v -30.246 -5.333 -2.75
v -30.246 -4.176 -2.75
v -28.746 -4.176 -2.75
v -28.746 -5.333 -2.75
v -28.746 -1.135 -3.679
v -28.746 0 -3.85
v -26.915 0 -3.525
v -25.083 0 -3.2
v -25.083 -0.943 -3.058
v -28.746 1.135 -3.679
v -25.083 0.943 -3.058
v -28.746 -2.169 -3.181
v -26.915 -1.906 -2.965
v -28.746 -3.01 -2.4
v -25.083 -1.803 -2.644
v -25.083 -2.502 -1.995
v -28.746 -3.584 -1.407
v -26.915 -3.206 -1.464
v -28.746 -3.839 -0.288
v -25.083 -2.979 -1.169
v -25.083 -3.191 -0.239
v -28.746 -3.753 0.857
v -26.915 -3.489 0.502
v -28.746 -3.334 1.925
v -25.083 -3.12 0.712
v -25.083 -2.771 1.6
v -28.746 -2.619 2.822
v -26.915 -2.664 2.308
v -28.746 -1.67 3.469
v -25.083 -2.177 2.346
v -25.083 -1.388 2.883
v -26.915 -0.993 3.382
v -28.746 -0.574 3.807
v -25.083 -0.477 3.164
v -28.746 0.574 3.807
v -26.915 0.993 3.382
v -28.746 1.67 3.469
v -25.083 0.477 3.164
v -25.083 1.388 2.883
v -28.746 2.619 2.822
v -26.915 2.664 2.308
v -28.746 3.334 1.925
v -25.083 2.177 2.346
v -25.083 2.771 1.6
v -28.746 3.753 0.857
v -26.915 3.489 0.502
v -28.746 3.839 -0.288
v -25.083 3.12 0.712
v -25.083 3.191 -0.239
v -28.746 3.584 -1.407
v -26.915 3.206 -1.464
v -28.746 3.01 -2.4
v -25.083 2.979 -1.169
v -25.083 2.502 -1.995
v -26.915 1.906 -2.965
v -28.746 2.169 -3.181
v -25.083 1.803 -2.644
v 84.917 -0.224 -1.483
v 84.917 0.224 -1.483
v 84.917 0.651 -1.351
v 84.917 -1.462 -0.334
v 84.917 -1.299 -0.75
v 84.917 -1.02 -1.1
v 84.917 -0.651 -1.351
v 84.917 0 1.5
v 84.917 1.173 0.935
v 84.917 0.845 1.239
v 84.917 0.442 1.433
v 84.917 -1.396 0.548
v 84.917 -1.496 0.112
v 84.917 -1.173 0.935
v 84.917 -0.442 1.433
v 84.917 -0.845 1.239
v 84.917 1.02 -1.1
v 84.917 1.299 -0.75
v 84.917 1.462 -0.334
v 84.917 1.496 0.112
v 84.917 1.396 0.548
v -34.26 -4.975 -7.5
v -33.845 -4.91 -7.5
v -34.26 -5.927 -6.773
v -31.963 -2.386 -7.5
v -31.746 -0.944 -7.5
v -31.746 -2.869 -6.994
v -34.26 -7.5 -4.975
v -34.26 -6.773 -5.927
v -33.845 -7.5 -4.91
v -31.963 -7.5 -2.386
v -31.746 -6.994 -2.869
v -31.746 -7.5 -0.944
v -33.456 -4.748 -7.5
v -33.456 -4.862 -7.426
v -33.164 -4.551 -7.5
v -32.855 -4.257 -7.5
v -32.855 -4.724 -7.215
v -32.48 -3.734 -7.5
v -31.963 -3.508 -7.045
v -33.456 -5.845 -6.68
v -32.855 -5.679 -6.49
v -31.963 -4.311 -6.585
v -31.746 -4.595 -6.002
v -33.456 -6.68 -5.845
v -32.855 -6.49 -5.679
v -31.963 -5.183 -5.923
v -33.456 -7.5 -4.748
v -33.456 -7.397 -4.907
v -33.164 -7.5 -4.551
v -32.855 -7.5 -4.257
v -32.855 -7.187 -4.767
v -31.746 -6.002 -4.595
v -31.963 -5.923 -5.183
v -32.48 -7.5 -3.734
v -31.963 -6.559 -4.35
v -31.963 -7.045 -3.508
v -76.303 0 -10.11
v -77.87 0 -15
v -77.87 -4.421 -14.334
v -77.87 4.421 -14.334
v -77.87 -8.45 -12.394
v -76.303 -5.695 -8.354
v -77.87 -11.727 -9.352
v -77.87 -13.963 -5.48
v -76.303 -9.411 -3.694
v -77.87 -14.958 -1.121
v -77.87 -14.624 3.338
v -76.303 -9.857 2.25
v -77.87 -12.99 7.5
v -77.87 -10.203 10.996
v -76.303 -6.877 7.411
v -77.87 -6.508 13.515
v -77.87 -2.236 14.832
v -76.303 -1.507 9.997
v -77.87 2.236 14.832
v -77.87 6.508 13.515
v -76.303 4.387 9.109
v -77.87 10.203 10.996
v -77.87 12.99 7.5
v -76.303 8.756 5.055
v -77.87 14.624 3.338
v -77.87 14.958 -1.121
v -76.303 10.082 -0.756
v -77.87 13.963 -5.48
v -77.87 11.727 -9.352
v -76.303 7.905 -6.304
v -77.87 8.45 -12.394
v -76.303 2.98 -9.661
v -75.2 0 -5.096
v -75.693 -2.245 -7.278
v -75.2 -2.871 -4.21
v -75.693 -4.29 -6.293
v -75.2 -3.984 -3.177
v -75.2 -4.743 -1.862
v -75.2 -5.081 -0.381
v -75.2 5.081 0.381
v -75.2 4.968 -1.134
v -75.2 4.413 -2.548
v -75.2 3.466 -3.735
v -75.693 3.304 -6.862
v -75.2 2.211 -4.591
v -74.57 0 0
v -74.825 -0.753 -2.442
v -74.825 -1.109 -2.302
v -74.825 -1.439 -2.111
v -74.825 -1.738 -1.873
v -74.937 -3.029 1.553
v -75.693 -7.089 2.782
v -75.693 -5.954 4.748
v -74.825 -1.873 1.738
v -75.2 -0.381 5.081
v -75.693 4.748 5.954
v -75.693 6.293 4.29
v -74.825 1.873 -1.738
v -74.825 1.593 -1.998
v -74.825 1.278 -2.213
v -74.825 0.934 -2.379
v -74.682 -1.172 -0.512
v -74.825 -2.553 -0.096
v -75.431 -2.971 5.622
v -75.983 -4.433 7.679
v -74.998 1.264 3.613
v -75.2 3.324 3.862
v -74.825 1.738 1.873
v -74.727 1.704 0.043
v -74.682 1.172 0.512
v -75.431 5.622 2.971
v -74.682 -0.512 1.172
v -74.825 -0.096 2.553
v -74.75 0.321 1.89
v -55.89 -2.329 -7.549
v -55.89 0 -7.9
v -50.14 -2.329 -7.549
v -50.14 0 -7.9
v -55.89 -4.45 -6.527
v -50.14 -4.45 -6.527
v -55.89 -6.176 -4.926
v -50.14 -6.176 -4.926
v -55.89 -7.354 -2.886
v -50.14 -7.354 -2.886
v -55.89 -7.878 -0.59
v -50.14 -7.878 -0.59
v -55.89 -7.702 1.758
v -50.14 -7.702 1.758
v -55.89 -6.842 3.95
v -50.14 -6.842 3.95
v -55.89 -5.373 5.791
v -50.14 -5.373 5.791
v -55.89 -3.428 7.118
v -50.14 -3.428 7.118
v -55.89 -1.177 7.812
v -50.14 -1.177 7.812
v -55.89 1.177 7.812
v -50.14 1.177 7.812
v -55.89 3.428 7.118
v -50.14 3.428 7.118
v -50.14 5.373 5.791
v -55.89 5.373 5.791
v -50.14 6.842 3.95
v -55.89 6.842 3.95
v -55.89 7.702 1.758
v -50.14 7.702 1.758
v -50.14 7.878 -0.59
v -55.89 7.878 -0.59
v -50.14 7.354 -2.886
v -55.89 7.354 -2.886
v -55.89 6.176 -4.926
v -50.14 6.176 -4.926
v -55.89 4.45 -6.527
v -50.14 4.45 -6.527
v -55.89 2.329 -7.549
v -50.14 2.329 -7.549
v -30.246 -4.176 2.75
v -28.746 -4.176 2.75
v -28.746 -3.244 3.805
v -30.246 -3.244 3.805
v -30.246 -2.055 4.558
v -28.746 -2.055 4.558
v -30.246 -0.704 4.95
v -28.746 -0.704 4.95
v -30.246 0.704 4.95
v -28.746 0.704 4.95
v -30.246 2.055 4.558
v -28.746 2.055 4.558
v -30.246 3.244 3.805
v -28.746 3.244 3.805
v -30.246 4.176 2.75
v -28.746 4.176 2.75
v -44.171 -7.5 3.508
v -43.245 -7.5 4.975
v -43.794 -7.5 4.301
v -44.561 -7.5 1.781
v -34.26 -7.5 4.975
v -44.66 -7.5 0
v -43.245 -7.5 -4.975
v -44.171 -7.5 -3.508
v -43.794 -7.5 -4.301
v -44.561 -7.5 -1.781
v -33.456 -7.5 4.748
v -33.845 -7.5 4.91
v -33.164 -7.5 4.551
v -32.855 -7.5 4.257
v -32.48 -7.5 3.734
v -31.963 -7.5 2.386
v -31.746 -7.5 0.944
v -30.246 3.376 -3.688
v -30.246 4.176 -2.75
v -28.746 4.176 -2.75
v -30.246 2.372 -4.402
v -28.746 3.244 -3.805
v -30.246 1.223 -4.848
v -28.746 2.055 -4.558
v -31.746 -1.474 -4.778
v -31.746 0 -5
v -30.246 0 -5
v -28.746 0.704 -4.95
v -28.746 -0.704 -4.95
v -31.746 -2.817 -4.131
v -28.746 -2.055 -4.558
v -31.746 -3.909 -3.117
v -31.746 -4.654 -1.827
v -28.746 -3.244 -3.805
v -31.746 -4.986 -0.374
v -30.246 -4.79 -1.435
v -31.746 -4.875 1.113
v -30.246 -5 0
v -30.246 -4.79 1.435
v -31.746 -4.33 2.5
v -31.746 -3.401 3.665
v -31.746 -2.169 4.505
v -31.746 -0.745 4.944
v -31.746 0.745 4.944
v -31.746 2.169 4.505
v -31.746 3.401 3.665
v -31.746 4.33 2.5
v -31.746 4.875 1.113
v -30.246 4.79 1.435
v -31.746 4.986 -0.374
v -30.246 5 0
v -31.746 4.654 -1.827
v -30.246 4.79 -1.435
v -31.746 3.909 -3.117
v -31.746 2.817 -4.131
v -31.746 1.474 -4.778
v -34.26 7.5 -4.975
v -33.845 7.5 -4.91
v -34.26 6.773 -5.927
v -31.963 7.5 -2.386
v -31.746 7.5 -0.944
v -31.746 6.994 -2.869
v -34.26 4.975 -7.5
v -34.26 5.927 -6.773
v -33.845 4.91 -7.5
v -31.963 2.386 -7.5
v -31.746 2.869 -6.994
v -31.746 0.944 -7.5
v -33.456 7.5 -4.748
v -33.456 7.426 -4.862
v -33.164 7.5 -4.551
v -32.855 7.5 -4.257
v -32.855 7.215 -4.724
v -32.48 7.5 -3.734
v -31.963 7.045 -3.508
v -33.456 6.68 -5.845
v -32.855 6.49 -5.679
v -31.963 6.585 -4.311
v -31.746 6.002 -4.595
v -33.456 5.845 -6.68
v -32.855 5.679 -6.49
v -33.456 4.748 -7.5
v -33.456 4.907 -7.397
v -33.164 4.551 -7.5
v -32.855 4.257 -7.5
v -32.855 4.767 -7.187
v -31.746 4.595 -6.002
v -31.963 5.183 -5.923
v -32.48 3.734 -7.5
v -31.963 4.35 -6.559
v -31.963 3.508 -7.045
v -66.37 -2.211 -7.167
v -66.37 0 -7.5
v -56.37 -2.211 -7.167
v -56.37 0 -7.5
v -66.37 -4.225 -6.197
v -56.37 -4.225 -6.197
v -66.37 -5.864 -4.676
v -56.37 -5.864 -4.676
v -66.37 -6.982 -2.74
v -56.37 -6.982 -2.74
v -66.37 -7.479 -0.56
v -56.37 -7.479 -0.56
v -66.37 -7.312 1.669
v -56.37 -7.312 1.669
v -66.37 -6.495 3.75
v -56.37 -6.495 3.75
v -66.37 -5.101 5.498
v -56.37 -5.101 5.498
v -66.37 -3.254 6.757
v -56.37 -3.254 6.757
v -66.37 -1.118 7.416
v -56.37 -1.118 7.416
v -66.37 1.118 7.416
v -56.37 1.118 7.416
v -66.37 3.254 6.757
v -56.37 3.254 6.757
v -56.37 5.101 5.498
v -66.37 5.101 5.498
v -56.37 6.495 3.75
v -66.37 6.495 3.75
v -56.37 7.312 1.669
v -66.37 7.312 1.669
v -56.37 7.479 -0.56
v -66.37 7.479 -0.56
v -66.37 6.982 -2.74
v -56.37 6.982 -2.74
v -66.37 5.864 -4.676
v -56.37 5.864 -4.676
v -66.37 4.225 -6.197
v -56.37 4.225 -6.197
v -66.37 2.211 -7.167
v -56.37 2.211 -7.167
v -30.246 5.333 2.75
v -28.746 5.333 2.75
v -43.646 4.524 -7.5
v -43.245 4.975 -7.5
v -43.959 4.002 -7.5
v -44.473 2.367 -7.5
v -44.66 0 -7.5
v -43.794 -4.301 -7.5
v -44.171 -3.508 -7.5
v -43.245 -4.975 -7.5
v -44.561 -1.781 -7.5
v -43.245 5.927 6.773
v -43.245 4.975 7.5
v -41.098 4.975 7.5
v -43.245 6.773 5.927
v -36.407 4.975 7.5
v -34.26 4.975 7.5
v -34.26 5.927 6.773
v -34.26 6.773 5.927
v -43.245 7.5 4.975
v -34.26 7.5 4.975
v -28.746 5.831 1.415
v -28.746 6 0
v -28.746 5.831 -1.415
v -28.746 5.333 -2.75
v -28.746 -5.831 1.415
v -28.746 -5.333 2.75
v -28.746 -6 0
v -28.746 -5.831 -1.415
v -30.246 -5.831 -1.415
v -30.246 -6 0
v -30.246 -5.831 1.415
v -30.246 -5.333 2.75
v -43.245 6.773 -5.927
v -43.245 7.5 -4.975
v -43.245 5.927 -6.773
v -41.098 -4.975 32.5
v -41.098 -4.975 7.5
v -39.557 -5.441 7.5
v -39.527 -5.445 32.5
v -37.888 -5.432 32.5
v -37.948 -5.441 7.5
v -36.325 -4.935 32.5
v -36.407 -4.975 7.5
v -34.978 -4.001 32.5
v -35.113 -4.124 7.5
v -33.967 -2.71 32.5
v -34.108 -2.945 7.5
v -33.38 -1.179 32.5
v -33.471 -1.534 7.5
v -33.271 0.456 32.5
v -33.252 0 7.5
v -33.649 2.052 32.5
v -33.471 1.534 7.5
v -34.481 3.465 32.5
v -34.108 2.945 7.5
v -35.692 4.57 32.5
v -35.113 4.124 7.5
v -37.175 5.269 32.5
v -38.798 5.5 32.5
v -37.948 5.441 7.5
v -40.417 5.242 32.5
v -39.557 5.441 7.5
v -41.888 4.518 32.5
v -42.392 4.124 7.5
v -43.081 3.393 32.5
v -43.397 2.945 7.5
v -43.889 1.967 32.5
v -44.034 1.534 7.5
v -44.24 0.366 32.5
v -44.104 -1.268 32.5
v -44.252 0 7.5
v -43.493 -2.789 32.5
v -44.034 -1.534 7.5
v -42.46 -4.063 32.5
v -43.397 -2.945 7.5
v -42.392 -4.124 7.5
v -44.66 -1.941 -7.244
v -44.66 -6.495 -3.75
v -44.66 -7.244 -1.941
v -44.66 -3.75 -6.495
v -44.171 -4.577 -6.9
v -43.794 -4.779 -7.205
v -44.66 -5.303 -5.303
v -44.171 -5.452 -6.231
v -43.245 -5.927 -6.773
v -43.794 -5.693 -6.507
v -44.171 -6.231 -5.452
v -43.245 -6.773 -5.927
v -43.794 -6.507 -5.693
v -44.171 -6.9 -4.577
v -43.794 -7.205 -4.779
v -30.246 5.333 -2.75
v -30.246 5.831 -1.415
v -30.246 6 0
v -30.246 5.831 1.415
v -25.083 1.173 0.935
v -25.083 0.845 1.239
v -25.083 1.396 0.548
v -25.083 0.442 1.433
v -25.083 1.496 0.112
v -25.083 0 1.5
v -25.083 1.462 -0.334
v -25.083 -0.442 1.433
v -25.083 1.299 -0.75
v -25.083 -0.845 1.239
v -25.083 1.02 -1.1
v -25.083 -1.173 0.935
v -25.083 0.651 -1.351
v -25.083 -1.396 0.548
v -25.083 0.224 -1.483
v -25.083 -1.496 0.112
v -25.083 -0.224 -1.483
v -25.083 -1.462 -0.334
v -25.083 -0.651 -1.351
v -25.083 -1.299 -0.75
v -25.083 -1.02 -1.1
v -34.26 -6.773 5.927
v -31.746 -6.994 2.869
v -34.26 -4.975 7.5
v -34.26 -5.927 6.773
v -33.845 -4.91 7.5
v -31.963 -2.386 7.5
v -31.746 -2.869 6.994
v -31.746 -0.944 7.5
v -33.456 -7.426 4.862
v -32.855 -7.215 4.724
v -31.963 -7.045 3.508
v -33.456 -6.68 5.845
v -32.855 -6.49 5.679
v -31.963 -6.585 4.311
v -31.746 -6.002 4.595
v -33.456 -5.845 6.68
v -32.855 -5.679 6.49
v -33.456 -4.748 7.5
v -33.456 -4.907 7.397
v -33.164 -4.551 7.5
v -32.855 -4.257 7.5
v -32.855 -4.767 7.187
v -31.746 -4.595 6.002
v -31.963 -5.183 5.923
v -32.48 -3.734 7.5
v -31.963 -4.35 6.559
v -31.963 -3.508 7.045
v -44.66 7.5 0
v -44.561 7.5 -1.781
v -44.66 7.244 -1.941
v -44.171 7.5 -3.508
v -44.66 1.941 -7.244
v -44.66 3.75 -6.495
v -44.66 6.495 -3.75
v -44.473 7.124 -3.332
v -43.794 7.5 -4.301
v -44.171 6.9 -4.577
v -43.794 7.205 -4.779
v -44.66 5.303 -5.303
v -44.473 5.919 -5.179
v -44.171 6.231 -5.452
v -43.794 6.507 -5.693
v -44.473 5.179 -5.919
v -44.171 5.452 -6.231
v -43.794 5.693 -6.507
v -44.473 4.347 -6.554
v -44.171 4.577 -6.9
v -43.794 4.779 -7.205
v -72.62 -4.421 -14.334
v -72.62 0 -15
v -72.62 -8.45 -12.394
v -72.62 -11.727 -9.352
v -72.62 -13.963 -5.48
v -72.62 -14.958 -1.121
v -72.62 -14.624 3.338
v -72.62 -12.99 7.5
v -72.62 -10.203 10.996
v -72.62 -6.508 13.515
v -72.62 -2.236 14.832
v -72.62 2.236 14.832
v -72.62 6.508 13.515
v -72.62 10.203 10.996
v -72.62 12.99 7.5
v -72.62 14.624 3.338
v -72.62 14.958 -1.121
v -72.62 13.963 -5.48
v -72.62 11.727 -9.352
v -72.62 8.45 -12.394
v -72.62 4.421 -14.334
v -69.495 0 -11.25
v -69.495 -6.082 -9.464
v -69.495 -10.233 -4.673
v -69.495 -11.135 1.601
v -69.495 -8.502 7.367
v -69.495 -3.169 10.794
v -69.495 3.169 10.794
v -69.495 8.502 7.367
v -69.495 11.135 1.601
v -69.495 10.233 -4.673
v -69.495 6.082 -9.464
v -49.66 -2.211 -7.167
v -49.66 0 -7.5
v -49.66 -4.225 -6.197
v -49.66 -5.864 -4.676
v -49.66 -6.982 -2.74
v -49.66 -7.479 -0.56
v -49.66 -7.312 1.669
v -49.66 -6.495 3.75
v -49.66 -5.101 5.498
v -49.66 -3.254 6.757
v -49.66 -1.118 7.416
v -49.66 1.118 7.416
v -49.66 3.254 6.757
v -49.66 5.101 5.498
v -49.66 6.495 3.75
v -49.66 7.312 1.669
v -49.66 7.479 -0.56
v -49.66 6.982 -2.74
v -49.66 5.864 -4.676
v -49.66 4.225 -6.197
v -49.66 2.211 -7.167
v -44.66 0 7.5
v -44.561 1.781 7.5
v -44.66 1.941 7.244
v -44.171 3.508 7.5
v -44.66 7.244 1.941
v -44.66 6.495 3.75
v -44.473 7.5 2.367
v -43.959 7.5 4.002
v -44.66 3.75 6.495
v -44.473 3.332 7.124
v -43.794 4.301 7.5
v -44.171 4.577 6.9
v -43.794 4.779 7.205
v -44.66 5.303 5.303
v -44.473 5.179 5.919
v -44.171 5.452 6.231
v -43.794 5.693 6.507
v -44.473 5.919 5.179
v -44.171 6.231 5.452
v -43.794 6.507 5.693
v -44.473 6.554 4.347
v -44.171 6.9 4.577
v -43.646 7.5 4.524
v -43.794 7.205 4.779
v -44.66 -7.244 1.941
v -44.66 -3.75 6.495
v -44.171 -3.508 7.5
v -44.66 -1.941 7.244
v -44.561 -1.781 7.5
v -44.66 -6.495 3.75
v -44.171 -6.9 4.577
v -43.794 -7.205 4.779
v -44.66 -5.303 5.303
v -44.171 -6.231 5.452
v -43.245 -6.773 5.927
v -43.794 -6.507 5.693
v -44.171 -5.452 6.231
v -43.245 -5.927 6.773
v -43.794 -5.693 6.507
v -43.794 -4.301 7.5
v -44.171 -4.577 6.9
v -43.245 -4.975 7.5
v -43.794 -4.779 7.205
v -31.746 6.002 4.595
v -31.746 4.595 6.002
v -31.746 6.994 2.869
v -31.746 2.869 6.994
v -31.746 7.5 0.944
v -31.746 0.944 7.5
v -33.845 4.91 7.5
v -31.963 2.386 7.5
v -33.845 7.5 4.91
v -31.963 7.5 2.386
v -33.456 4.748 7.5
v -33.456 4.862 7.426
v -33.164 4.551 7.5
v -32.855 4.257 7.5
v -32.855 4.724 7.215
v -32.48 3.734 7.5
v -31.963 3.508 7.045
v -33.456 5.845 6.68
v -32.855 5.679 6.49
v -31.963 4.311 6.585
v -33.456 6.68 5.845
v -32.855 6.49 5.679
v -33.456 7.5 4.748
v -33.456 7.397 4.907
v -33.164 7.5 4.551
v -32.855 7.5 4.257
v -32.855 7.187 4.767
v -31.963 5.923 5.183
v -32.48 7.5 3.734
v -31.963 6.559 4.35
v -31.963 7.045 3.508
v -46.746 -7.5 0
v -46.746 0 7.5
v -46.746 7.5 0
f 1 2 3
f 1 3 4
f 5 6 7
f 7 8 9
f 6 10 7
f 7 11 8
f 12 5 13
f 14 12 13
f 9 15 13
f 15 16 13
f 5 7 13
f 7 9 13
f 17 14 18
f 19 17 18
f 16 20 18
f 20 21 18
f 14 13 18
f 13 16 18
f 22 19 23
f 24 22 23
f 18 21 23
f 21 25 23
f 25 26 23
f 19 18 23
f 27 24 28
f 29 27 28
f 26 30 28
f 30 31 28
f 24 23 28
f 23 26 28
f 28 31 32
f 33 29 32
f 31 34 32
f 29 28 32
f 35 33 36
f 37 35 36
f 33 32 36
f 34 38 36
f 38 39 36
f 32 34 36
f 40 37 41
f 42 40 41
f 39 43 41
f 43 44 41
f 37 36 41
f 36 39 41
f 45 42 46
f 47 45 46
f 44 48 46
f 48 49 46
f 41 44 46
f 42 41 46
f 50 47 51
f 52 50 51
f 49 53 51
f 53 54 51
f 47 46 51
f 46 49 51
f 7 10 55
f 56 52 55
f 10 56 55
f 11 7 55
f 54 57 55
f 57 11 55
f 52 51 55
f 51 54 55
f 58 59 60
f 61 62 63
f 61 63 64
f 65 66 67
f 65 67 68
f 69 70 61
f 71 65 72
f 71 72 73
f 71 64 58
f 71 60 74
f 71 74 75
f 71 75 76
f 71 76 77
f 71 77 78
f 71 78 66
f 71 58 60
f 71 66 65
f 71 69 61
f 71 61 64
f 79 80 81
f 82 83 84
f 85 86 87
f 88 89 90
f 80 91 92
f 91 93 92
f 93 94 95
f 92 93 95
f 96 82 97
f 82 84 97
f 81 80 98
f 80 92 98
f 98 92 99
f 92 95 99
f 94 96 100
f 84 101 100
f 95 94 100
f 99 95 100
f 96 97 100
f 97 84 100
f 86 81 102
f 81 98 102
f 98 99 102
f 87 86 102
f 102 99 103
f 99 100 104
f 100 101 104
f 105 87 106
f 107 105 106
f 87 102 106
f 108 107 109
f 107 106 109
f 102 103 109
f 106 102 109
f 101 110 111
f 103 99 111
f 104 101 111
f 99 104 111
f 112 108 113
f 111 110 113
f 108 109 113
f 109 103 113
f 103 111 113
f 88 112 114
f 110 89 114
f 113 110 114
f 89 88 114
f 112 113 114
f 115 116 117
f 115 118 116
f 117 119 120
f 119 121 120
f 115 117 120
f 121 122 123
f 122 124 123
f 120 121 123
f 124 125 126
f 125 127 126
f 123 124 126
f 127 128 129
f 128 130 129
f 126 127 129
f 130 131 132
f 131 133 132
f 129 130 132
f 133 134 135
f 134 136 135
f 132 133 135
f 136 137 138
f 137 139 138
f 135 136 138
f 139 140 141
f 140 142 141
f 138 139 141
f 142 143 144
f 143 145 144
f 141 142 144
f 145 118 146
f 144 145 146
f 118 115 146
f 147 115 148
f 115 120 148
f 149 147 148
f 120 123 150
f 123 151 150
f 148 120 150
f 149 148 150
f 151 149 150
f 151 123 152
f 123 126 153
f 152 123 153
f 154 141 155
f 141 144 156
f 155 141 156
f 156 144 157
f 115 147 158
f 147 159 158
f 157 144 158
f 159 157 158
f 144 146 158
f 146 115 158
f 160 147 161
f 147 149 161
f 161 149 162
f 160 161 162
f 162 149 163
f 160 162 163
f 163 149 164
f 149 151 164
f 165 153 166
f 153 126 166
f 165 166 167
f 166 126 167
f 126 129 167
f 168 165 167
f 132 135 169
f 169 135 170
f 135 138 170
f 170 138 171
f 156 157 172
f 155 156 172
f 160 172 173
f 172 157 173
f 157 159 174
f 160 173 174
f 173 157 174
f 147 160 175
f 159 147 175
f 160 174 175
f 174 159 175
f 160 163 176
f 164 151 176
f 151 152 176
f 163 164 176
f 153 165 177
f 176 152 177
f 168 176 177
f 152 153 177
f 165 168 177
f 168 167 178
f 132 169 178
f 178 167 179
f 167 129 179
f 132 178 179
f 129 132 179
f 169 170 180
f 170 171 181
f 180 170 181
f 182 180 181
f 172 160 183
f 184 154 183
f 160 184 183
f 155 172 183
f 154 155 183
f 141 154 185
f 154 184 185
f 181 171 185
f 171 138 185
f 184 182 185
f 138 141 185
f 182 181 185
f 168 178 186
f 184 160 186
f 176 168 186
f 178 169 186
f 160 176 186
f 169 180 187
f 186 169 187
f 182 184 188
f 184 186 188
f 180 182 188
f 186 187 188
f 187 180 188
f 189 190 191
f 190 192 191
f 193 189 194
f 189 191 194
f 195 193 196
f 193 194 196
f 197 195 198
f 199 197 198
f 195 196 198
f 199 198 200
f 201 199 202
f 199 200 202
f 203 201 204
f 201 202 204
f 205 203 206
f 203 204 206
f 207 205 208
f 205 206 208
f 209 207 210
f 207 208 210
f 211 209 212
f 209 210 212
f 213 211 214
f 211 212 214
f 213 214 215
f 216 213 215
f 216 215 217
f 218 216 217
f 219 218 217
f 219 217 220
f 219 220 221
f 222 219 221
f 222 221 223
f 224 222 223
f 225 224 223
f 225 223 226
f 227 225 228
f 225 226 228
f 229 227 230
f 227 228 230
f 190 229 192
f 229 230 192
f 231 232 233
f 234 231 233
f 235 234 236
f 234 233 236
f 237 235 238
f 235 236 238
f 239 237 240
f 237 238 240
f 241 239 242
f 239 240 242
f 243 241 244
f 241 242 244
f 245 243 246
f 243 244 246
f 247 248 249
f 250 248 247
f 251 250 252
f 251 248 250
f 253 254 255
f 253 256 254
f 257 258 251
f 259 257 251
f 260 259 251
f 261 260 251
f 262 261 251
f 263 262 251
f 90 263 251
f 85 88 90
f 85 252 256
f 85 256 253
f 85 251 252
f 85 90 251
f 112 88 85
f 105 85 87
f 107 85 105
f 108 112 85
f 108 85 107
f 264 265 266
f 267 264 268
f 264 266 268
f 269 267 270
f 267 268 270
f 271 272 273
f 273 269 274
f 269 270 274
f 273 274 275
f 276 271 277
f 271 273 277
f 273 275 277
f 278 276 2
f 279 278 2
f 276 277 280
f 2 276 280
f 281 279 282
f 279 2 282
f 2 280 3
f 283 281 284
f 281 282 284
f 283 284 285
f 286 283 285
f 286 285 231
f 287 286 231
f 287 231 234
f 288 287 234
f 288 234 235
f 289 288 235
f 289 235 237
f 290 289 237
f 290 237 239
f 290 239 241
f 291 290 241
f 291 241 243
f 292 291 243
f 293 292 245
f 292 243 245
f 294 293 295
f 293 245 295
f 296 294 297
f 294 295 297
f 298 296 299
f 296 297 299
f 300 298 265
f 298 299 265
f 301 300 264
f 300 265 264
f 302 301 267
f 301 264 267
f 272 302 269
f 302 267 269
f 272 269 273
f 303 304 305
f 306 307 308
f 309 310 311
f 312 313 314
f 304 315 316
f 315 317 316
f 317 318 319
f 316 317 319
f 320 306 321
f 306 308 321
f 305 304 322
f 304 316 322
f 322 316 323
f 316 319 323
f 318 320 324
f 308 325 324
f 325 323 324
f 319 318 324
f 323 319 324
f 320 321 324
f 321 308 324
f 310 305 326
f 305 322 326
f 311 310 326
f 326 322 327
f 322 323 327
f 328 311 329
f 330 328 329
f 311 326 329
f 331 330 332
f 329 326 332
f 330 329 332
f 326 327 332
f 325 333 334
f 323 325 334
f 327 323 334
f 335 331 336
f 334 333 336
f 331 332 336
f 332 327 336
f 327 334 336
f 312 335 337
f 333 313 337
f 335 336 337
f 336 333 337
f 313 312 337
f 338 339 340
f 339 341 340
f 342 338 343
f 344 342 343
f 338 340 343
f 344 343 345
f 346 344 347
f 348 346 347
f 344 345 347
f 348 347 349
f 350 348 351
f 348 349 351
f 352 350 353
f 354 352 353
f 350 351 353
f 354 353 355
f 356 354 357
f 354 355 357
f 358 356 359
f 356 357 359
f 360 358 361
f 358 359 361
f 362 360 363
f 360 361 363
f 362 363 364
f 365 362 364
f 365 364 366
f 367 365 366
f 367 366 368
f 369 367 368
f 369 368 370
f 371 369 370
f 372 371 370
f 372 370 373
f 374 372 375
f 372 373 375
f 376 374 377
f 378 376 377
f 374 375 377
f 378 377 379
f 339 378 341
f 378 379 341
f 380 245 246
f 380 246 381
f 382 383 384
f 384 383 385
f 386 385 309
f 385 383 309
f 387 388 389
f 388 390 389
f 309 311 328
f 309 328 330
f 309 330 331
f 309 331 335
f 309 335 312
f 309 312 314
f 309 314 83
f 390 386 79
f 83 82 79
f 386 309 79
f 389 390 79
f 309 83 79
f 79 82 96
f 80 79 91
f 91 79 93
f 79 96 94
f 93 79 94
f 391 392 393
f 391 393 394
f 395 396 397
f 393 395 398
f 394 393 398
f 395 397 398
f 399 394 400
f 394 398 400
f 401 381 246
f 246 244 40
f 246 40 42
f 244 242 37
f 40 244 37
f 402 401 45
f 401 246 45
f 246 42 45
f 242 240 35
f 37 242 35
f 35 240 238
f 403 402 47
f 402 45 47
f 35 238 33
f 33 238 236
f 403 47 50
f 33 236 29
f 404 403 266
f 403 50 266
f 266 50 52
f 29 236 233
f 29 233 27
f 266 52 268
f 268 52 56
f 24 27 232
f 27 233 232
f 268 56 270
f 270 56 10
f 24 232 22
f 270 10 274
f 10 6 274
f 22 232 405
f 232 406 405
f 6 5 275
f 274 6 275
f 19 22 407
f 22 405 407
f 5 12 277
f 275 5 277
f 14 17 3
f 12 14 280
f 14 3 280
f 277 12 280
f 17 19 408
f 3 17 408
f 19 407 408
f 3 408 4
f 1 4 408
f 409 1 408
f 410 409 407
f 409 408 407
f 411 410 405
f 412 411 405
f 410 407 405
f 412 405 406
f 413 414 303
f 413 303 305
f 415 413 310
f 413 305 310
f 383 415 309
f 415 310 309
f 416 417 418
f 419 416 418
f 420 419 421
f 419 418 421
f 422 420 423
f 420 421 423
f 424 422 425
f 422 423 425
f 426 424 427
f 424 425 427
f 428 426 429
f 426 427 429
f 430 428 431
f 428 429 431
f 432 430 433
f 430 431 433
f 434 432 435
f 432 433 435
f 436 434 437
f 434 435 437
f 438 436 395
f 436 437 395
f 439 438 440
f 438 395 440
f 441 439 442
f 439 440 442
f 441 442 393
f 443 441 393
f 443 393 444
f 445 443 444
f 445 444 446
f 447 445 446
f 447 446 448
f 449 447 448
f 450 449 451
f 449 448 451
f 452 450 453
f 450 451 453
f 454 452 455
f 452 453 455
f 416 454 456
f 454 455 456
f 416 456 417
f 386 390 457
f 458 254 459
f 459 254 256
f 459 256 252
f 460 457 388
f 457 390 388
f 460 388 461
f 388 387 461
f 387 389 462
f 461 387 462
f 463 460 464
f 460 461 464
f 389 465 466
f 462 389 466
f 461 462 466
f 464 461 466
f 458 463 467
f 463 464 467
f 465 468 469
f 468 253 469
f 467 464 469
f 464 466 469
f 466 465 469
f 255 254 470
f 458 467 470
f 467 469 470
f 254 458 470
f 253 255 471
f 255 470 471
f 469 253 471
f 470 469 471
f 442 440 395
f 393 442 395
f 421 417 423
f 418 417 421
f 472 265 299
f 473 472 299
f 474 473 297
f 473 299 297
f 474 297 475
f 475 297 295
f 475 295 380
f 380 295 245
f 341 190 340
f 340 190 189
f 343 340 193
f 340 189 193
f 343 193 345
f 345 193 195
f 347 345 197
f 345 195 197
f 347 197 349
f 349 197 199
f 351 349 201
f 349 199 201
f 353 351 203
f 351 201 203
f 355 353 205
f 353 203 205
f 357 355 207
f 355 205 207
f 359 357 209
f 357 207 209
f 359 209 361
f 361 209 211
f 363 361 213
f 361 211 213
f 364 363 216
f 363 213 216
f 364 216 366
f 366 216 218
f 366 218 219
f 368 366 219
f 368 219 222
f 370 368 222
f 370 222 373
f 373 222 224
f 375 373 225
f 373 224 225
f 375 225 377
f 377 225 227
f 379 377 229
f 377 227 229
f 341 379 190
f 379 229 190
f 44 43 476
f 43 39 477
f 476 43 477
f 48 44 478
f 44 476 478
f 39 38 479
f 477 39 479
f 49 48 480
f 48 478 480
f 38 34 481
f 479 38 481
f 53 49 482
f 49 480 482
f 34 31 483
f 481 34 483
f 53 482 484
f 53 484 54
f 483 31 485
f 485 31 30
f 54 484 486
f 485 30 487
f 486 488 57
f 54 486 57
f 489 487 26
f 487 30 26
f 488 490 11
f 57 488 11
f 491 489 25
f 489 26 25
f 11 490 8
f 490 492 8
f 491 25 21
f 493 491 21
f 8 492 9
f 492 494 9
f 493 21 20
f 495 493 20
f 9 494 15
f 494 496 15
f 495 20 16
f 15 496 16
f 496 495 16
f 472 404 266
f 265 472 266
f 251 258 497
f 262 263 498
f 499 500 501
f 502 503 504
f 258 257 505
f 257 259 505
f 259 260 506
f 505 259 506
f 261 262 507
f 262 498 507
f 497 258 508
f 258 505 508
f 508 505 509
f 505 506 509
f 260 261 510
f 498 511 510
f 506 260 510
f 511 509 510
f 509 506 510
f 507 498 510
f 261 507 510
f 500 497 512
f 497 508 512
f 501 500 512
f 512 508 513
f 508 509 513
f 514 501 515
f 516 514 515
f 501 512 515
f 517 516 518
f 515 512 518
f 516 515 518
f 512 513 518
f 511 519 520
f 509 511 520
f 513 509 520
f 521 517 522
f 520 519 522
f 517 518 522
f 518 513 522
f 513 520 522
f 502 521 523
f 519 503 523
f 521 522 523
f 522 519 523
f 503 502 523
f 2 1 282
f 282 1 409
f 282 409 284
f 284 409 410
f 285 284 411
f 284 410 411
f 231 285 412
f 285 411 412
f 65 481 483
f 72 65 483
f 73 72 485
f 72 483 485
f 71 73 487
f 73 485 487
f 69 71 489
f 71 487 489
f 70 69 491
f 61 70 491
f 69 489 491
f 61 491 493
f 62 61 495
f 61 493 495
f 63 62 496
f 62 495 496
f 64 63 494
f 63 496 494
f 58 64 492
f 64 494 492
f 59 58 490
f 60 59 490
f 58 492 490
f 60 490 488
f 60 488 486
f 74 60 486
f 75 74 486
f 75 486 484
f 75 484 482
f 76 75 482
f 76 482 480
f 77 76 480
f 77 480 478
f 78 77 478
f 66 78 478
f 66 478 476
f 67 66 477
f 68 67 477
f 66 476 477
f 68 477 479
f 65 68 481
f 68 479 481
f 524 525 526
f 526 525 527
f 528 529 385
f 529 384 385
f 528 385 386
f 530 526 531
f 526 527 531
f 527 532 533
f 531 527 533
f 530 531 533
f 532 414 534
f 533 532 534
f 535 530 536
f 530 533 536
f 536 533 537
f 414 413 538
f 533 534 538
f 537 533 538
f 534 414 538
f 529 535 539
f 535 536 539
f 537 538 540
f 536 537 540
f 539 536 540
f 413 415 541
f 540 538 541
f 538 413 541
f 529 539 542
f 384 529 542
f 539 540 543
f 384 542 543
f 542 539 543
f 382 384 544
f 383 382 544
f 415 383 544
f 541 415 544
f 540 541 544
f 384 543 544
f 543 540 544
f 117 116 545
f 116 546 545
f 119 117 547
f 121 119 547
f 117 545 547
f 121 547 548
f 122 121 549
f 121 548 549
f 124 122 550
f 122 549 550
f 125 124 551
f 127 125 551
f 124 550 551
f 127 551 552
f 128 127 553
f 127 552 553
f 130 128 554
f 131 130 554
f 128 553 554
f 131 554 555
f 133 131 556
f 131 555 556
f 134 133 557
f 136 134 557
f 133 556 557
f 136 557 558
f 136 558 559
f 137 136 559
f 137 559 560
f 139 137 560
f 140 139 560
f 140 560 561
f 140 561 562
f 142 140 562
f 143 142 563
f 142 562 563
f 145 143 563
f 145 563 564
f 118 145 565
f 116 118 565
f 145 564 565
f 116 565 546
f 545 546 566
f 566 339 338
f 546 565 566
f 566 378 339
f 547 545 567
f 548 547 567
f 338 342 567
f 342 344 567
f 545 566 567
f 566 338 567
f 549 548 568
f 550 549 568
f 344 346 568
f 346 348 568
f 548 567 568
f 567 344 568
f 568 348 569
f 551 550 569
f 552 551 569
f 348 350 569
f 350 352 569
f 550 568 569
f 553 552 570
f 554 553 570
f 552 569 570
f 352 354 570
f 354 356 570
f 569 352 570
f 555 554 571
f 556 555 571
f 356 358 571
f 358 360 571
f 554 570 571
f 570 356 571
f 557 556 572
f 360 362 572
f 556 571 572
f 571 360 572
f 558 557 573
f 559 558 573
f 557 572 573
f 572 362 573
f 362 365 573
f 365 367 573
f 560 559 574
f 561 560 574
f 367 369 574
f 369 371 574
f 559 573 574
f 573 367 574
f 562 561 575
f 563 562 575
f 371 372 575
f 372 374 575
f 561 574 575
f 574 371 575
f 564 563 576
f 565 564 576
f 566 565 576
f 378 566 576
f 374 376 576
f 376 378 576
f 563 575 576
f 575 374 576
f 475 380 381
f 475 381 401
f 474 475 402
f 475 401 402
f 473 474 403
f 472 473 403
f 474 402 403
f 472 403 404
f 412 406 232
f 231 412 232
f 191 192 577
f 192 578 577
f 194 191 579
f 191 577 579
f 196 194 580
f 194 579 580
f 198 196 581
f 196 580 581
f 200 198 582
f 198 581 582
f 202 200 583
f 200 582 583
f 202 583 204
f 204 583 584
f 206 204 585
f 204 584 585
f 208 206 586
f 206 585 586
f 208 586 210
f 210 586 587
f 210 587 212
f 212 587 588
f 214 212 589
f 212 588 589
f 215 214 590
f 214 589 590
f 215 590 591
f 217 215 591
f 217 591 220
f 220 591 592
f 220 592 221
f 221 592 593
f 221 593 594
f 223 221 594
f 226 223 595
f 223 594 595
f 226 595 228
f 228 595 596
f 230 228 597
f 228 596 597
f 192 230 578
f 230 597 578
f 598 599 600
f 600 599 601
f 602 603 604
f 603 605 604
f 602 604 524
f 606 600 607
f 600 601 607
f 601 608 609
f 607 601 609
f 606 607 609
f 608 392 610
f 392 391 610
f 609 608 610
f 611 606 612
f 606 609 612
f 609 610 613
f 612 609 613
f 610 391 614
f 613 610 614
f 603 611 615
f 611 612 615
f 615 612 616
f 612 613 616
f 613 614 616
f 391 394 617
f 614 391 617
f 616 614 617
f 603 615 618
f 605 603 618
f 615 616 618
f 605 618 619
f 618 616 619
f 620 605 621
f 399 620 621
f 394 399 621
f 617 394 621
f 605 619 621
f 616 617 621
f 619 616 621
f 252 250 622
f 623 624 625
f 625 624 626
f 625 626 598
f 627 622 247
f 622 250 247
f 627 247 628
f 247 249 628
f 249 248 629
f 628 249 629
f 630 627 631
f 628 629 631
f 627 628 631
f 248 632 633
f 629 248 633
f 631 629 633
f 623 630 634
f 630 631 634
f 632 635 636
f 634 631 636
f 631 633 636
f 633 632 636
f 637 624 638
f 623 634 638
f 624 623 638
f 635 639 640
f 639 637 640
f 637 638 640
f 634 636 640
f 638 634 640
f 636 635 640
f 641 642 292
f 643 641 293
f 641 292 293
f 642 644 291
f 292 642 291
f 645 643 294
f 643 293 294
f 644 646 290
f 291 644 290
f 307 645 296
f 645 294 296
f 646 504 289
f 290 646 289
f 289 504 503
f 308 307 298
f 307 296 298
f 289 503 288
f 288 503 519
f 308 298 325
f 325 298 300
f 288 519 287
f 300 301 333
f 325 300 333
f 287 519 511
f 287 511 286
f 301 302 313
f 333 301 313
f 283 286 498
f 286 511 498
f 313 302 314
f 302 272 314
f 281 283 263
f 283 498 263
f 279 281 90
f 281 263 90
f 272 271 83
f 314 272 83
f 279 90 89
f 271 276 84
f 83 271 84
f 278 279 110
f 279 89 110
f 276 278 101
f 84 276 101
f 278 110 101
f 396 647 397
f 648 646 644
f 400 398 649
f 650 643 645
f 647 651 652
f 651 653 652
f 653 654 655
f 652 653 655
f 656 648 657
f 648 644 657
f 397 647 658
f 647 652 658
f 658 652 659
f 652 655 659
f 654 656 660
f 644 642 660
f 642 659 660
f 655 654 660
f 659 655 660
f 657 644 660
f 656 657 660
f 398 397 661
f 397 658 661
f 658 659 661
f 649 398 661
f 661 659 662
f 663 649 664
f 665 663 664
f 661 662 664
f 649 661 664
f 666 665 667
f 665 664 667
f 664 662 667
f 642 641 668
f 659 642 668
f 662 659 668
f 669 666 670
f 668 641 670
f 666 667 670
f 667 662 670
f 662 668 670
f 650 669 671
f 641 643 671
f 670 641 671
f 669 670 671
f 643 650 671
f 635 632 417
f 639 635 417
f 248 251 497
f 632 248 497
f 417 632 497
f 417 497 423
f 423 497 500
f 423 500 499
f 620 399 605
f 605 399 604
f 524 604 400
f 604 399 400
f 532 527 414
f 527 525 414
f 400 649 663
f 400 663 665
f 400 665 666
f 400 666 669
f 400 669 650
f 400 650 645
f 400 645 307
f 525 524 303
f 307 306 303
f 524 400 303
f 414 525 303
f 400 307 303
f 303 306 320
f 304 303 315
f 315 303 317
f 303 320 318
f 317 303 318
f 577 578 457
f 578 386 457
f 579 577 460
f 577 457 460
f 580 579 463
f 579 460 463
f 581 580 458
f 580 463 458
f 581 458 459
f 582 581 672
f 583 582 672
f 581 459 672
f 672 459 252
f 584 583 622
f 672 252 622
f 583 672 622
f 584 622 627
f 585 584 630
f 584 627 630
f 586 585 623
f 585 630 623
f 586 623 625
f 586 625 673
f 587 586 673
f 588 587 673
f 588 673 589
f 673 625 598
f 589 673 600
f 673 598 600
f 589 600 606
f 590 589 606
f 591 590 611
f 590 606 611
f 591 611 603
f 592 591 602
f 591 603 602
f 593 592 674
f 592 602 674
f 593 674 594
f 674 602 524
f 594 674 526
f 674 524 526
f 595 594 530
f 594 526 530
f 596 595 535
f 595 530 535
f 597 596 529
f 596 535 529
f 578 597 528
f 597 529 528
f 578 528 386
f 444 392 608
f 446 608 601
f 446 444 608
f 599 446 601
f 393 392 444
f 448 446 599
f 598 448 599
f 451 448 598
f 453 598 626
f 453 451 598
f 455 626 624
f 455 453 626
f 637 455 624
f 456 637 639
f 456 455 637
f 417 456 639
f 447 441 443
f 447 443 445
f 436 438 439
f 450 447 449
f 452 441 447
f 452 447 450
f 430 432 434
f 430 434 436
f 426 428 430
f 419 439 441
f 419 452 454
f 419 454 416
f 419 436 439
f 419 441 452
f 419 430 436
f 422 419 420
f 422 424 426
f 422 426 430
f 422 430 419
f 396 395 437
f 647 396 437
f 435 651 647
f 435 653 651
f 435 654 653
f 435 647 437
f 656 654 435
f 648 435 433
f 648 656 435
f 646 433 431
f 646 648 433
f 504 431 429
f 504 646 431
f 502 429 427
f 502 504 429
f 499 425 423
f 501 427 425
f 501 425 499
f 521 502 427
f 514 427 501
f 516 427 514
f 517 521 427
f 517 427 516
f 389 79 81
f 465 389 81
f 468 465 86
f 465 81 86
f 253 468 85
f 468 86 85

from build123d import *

# Parameters (mm, degrees)
SKETCH2_W           = 24.86541407
SKETCH2_H           = 5.423229841
SKETCH2_H_2         = 4.001260317
CUT_EXTRUDE1_DEPTH  = 15
CIRPATTERN1_COUNT   = 2
CIRPATTERN1_ANGLE   = 90
CUT_EXTRUDE2_DEPTH  = 1.5
SKETCH4_R           = 5.5
BOSS_EXTRUDE1_DEPTH = 25
SKETCH5_R           = 1.5
BOSS_EXTRUDE2_DEPTH = 110


with BuildPart() as part:
    # Sketch1 → Revolve1 (revolve)
    with BuildSketch(Plane.XY, mode=Mode.PRIVATE) as revolve1_sk:
        with BuildLine():
            ThreePointArc((-74.569724464, 0), (-75.692690434, -7.615947487), (-77.869724464, -15))
            Line((-77.869724464, -15), (-72.619724464, -15))
            Line((-72.619724464, -15), (-66.369724464, -7.5))
            Line((-66.369724464, -7.5), (-56.369724464, -7.5))
            Line((-56.369724464, -7.5), (-55.889724464, -7.9))
            Line((-55.889724464, -7.9), (-50.139724464, -7.9))
            Line((-50.139724464, -7.9), (-49.659724464, -7.5))
            Line((-49.659724464, -7.5), (-44.659724464, -7.5))
            ThreePointArc((-44.659724464, -7.5), (-44.085344133, -8.375316627), (-43.245187811, -9))
            Line((-43.245187811, -9), (-40.559724464, -9))
            Line((-40.559724464, -9), (-34.259724464, -9))
            ThreePointArc((-34.259724464, -9), (-32.817493666, -8.603076001), (-31.746136172, -7.559154808))
            Line((-31.746136172, -7.559154808), (-31.746136172, -5))
            Line((-31.746136172, -5), (-30.246136172, -5))
            Line((-30.246136172, -5), (-30.246136172, -6))
            Line((-30.246136172, -6), (-28.746136172, -6))
            Line((-28.746136172, -6), (-28.746136172, -3.85))
            Line((-28.746136172, -3.85), (-25.083482145, -3.2))
            Line((-25.083482145, -3.2), (-25.083482145, 0))
            Line((-25.083482145, 0), (-74.569724464, 0))
        make_face()
    revolve(revolve1_sk.sketch.rotate(Axis((88.99, 0, 0), (-1, 0, 0)), 270), axis=Axis((88.99, 0, 0), (-1, 0, 0)))

    # Sketch2 → Cut-Extrude1 (cut)
    with BuildSketch(Plane(origin=(-31.746136172, 0, 0), x_dir=(0, 0, -1), z_dir=(1, 0, 0))):
        with Locations((0, -10.211614921)):
            Rectangle(SKETCH2_W, SKETCH2_H)
        with Locations((0, 9.500630158)):
            Rectangle(SKETCH2_W, SKETCH2_H_2)
    cut_extrude1 = extrude(amount=-CUT_EXTRUDE1_DEPTH, mode=Mode.SUBTRACT)

    # CirPattern1: Cut-Extrude1 ×2 about axis
    cirpattern1_axis = Axis((88.99, 0, 0), (-1, 0, 0))
    for i in range(1, CIRPATTERN1_COUNT):
        add(cut_extrude1.rotate(cirpattern1_axis, i * CIRPATTERN1_ANGLE / (CIRPATTERN1_COUNT - 1)), mode=Mode.SUBTRACT)

    # Sketch3 → Cut-Extrude2 (cut)
    with BuildSketch(Plane(origin=(-28.746136172, 0, 0), x_dir=(0, 0, -1), z_dir=(1, 0, 0))):
        with BuildLine():
            Line((2.75, -4.175823272), (2.75, -6.437196595))
            Line((2.75, -6.437196595), (5.963766818, -6.437196595))
            Line((5.963766818, -6.437196595), (6.43018781, 6.437196595))
            Line((6.43018781, 6.437196595), (2.75, 6.437196595))
            Line((2.75, 6.437196595), (2.75, 4.175823272))
            ThreePointArc((2.75, 4.175823272), (5, 0), (2.75, -4.175823272))
        make_face()
        with BuildLine():
            Line((-2.75, -6.437196595), (-2.75, -4.175823272))
            ThreePointArc((-2.75, -4.175823272), (-5, 0), (-2.75, 4.175823272))
            Line((-2.75, 4.175823272), (-2.75, 6.437196595))
            Line((-2.75, 6.437196595), (-6.280612264, 6.437196595))
            Line((-6.280612264, 6.437196595), (-6.280612264, -6.437196595))
            Line((-6.280612264, -6.437196595), (-2.75, -6.437196595))
        make_face()
    extrude(amount=-CUT_EXTRUDE2_DEPTH, mode=Mode.SUBTRACT)

    # Sketch4 → Boss-Extrude1 (add)
    with BuildSketch(Plane.XY.offset(7.5)):
        with Locations(Location((-38.752456137, 0, 0), (0, 0, 244.760598179))):
            Circle(SKETCH4_R)
    extrude(amount=BOSS_EXTRUDE1_DEPTH)

    # Sketch5 → Boss-Extrude2 (add)
    with BuildSketch(Plane(origin=(-25.083482145, 0, 0), x_dir=(0, 0, -1), z_dir=(1, 0, 0))):
        with Locations(Location((0, 0, 0), (0, 0, 180))):
            Circle(SKETCH5_R)
    extrude(amount=BOSS_EXTRUDE2_DEPTH)


solid = part.part
